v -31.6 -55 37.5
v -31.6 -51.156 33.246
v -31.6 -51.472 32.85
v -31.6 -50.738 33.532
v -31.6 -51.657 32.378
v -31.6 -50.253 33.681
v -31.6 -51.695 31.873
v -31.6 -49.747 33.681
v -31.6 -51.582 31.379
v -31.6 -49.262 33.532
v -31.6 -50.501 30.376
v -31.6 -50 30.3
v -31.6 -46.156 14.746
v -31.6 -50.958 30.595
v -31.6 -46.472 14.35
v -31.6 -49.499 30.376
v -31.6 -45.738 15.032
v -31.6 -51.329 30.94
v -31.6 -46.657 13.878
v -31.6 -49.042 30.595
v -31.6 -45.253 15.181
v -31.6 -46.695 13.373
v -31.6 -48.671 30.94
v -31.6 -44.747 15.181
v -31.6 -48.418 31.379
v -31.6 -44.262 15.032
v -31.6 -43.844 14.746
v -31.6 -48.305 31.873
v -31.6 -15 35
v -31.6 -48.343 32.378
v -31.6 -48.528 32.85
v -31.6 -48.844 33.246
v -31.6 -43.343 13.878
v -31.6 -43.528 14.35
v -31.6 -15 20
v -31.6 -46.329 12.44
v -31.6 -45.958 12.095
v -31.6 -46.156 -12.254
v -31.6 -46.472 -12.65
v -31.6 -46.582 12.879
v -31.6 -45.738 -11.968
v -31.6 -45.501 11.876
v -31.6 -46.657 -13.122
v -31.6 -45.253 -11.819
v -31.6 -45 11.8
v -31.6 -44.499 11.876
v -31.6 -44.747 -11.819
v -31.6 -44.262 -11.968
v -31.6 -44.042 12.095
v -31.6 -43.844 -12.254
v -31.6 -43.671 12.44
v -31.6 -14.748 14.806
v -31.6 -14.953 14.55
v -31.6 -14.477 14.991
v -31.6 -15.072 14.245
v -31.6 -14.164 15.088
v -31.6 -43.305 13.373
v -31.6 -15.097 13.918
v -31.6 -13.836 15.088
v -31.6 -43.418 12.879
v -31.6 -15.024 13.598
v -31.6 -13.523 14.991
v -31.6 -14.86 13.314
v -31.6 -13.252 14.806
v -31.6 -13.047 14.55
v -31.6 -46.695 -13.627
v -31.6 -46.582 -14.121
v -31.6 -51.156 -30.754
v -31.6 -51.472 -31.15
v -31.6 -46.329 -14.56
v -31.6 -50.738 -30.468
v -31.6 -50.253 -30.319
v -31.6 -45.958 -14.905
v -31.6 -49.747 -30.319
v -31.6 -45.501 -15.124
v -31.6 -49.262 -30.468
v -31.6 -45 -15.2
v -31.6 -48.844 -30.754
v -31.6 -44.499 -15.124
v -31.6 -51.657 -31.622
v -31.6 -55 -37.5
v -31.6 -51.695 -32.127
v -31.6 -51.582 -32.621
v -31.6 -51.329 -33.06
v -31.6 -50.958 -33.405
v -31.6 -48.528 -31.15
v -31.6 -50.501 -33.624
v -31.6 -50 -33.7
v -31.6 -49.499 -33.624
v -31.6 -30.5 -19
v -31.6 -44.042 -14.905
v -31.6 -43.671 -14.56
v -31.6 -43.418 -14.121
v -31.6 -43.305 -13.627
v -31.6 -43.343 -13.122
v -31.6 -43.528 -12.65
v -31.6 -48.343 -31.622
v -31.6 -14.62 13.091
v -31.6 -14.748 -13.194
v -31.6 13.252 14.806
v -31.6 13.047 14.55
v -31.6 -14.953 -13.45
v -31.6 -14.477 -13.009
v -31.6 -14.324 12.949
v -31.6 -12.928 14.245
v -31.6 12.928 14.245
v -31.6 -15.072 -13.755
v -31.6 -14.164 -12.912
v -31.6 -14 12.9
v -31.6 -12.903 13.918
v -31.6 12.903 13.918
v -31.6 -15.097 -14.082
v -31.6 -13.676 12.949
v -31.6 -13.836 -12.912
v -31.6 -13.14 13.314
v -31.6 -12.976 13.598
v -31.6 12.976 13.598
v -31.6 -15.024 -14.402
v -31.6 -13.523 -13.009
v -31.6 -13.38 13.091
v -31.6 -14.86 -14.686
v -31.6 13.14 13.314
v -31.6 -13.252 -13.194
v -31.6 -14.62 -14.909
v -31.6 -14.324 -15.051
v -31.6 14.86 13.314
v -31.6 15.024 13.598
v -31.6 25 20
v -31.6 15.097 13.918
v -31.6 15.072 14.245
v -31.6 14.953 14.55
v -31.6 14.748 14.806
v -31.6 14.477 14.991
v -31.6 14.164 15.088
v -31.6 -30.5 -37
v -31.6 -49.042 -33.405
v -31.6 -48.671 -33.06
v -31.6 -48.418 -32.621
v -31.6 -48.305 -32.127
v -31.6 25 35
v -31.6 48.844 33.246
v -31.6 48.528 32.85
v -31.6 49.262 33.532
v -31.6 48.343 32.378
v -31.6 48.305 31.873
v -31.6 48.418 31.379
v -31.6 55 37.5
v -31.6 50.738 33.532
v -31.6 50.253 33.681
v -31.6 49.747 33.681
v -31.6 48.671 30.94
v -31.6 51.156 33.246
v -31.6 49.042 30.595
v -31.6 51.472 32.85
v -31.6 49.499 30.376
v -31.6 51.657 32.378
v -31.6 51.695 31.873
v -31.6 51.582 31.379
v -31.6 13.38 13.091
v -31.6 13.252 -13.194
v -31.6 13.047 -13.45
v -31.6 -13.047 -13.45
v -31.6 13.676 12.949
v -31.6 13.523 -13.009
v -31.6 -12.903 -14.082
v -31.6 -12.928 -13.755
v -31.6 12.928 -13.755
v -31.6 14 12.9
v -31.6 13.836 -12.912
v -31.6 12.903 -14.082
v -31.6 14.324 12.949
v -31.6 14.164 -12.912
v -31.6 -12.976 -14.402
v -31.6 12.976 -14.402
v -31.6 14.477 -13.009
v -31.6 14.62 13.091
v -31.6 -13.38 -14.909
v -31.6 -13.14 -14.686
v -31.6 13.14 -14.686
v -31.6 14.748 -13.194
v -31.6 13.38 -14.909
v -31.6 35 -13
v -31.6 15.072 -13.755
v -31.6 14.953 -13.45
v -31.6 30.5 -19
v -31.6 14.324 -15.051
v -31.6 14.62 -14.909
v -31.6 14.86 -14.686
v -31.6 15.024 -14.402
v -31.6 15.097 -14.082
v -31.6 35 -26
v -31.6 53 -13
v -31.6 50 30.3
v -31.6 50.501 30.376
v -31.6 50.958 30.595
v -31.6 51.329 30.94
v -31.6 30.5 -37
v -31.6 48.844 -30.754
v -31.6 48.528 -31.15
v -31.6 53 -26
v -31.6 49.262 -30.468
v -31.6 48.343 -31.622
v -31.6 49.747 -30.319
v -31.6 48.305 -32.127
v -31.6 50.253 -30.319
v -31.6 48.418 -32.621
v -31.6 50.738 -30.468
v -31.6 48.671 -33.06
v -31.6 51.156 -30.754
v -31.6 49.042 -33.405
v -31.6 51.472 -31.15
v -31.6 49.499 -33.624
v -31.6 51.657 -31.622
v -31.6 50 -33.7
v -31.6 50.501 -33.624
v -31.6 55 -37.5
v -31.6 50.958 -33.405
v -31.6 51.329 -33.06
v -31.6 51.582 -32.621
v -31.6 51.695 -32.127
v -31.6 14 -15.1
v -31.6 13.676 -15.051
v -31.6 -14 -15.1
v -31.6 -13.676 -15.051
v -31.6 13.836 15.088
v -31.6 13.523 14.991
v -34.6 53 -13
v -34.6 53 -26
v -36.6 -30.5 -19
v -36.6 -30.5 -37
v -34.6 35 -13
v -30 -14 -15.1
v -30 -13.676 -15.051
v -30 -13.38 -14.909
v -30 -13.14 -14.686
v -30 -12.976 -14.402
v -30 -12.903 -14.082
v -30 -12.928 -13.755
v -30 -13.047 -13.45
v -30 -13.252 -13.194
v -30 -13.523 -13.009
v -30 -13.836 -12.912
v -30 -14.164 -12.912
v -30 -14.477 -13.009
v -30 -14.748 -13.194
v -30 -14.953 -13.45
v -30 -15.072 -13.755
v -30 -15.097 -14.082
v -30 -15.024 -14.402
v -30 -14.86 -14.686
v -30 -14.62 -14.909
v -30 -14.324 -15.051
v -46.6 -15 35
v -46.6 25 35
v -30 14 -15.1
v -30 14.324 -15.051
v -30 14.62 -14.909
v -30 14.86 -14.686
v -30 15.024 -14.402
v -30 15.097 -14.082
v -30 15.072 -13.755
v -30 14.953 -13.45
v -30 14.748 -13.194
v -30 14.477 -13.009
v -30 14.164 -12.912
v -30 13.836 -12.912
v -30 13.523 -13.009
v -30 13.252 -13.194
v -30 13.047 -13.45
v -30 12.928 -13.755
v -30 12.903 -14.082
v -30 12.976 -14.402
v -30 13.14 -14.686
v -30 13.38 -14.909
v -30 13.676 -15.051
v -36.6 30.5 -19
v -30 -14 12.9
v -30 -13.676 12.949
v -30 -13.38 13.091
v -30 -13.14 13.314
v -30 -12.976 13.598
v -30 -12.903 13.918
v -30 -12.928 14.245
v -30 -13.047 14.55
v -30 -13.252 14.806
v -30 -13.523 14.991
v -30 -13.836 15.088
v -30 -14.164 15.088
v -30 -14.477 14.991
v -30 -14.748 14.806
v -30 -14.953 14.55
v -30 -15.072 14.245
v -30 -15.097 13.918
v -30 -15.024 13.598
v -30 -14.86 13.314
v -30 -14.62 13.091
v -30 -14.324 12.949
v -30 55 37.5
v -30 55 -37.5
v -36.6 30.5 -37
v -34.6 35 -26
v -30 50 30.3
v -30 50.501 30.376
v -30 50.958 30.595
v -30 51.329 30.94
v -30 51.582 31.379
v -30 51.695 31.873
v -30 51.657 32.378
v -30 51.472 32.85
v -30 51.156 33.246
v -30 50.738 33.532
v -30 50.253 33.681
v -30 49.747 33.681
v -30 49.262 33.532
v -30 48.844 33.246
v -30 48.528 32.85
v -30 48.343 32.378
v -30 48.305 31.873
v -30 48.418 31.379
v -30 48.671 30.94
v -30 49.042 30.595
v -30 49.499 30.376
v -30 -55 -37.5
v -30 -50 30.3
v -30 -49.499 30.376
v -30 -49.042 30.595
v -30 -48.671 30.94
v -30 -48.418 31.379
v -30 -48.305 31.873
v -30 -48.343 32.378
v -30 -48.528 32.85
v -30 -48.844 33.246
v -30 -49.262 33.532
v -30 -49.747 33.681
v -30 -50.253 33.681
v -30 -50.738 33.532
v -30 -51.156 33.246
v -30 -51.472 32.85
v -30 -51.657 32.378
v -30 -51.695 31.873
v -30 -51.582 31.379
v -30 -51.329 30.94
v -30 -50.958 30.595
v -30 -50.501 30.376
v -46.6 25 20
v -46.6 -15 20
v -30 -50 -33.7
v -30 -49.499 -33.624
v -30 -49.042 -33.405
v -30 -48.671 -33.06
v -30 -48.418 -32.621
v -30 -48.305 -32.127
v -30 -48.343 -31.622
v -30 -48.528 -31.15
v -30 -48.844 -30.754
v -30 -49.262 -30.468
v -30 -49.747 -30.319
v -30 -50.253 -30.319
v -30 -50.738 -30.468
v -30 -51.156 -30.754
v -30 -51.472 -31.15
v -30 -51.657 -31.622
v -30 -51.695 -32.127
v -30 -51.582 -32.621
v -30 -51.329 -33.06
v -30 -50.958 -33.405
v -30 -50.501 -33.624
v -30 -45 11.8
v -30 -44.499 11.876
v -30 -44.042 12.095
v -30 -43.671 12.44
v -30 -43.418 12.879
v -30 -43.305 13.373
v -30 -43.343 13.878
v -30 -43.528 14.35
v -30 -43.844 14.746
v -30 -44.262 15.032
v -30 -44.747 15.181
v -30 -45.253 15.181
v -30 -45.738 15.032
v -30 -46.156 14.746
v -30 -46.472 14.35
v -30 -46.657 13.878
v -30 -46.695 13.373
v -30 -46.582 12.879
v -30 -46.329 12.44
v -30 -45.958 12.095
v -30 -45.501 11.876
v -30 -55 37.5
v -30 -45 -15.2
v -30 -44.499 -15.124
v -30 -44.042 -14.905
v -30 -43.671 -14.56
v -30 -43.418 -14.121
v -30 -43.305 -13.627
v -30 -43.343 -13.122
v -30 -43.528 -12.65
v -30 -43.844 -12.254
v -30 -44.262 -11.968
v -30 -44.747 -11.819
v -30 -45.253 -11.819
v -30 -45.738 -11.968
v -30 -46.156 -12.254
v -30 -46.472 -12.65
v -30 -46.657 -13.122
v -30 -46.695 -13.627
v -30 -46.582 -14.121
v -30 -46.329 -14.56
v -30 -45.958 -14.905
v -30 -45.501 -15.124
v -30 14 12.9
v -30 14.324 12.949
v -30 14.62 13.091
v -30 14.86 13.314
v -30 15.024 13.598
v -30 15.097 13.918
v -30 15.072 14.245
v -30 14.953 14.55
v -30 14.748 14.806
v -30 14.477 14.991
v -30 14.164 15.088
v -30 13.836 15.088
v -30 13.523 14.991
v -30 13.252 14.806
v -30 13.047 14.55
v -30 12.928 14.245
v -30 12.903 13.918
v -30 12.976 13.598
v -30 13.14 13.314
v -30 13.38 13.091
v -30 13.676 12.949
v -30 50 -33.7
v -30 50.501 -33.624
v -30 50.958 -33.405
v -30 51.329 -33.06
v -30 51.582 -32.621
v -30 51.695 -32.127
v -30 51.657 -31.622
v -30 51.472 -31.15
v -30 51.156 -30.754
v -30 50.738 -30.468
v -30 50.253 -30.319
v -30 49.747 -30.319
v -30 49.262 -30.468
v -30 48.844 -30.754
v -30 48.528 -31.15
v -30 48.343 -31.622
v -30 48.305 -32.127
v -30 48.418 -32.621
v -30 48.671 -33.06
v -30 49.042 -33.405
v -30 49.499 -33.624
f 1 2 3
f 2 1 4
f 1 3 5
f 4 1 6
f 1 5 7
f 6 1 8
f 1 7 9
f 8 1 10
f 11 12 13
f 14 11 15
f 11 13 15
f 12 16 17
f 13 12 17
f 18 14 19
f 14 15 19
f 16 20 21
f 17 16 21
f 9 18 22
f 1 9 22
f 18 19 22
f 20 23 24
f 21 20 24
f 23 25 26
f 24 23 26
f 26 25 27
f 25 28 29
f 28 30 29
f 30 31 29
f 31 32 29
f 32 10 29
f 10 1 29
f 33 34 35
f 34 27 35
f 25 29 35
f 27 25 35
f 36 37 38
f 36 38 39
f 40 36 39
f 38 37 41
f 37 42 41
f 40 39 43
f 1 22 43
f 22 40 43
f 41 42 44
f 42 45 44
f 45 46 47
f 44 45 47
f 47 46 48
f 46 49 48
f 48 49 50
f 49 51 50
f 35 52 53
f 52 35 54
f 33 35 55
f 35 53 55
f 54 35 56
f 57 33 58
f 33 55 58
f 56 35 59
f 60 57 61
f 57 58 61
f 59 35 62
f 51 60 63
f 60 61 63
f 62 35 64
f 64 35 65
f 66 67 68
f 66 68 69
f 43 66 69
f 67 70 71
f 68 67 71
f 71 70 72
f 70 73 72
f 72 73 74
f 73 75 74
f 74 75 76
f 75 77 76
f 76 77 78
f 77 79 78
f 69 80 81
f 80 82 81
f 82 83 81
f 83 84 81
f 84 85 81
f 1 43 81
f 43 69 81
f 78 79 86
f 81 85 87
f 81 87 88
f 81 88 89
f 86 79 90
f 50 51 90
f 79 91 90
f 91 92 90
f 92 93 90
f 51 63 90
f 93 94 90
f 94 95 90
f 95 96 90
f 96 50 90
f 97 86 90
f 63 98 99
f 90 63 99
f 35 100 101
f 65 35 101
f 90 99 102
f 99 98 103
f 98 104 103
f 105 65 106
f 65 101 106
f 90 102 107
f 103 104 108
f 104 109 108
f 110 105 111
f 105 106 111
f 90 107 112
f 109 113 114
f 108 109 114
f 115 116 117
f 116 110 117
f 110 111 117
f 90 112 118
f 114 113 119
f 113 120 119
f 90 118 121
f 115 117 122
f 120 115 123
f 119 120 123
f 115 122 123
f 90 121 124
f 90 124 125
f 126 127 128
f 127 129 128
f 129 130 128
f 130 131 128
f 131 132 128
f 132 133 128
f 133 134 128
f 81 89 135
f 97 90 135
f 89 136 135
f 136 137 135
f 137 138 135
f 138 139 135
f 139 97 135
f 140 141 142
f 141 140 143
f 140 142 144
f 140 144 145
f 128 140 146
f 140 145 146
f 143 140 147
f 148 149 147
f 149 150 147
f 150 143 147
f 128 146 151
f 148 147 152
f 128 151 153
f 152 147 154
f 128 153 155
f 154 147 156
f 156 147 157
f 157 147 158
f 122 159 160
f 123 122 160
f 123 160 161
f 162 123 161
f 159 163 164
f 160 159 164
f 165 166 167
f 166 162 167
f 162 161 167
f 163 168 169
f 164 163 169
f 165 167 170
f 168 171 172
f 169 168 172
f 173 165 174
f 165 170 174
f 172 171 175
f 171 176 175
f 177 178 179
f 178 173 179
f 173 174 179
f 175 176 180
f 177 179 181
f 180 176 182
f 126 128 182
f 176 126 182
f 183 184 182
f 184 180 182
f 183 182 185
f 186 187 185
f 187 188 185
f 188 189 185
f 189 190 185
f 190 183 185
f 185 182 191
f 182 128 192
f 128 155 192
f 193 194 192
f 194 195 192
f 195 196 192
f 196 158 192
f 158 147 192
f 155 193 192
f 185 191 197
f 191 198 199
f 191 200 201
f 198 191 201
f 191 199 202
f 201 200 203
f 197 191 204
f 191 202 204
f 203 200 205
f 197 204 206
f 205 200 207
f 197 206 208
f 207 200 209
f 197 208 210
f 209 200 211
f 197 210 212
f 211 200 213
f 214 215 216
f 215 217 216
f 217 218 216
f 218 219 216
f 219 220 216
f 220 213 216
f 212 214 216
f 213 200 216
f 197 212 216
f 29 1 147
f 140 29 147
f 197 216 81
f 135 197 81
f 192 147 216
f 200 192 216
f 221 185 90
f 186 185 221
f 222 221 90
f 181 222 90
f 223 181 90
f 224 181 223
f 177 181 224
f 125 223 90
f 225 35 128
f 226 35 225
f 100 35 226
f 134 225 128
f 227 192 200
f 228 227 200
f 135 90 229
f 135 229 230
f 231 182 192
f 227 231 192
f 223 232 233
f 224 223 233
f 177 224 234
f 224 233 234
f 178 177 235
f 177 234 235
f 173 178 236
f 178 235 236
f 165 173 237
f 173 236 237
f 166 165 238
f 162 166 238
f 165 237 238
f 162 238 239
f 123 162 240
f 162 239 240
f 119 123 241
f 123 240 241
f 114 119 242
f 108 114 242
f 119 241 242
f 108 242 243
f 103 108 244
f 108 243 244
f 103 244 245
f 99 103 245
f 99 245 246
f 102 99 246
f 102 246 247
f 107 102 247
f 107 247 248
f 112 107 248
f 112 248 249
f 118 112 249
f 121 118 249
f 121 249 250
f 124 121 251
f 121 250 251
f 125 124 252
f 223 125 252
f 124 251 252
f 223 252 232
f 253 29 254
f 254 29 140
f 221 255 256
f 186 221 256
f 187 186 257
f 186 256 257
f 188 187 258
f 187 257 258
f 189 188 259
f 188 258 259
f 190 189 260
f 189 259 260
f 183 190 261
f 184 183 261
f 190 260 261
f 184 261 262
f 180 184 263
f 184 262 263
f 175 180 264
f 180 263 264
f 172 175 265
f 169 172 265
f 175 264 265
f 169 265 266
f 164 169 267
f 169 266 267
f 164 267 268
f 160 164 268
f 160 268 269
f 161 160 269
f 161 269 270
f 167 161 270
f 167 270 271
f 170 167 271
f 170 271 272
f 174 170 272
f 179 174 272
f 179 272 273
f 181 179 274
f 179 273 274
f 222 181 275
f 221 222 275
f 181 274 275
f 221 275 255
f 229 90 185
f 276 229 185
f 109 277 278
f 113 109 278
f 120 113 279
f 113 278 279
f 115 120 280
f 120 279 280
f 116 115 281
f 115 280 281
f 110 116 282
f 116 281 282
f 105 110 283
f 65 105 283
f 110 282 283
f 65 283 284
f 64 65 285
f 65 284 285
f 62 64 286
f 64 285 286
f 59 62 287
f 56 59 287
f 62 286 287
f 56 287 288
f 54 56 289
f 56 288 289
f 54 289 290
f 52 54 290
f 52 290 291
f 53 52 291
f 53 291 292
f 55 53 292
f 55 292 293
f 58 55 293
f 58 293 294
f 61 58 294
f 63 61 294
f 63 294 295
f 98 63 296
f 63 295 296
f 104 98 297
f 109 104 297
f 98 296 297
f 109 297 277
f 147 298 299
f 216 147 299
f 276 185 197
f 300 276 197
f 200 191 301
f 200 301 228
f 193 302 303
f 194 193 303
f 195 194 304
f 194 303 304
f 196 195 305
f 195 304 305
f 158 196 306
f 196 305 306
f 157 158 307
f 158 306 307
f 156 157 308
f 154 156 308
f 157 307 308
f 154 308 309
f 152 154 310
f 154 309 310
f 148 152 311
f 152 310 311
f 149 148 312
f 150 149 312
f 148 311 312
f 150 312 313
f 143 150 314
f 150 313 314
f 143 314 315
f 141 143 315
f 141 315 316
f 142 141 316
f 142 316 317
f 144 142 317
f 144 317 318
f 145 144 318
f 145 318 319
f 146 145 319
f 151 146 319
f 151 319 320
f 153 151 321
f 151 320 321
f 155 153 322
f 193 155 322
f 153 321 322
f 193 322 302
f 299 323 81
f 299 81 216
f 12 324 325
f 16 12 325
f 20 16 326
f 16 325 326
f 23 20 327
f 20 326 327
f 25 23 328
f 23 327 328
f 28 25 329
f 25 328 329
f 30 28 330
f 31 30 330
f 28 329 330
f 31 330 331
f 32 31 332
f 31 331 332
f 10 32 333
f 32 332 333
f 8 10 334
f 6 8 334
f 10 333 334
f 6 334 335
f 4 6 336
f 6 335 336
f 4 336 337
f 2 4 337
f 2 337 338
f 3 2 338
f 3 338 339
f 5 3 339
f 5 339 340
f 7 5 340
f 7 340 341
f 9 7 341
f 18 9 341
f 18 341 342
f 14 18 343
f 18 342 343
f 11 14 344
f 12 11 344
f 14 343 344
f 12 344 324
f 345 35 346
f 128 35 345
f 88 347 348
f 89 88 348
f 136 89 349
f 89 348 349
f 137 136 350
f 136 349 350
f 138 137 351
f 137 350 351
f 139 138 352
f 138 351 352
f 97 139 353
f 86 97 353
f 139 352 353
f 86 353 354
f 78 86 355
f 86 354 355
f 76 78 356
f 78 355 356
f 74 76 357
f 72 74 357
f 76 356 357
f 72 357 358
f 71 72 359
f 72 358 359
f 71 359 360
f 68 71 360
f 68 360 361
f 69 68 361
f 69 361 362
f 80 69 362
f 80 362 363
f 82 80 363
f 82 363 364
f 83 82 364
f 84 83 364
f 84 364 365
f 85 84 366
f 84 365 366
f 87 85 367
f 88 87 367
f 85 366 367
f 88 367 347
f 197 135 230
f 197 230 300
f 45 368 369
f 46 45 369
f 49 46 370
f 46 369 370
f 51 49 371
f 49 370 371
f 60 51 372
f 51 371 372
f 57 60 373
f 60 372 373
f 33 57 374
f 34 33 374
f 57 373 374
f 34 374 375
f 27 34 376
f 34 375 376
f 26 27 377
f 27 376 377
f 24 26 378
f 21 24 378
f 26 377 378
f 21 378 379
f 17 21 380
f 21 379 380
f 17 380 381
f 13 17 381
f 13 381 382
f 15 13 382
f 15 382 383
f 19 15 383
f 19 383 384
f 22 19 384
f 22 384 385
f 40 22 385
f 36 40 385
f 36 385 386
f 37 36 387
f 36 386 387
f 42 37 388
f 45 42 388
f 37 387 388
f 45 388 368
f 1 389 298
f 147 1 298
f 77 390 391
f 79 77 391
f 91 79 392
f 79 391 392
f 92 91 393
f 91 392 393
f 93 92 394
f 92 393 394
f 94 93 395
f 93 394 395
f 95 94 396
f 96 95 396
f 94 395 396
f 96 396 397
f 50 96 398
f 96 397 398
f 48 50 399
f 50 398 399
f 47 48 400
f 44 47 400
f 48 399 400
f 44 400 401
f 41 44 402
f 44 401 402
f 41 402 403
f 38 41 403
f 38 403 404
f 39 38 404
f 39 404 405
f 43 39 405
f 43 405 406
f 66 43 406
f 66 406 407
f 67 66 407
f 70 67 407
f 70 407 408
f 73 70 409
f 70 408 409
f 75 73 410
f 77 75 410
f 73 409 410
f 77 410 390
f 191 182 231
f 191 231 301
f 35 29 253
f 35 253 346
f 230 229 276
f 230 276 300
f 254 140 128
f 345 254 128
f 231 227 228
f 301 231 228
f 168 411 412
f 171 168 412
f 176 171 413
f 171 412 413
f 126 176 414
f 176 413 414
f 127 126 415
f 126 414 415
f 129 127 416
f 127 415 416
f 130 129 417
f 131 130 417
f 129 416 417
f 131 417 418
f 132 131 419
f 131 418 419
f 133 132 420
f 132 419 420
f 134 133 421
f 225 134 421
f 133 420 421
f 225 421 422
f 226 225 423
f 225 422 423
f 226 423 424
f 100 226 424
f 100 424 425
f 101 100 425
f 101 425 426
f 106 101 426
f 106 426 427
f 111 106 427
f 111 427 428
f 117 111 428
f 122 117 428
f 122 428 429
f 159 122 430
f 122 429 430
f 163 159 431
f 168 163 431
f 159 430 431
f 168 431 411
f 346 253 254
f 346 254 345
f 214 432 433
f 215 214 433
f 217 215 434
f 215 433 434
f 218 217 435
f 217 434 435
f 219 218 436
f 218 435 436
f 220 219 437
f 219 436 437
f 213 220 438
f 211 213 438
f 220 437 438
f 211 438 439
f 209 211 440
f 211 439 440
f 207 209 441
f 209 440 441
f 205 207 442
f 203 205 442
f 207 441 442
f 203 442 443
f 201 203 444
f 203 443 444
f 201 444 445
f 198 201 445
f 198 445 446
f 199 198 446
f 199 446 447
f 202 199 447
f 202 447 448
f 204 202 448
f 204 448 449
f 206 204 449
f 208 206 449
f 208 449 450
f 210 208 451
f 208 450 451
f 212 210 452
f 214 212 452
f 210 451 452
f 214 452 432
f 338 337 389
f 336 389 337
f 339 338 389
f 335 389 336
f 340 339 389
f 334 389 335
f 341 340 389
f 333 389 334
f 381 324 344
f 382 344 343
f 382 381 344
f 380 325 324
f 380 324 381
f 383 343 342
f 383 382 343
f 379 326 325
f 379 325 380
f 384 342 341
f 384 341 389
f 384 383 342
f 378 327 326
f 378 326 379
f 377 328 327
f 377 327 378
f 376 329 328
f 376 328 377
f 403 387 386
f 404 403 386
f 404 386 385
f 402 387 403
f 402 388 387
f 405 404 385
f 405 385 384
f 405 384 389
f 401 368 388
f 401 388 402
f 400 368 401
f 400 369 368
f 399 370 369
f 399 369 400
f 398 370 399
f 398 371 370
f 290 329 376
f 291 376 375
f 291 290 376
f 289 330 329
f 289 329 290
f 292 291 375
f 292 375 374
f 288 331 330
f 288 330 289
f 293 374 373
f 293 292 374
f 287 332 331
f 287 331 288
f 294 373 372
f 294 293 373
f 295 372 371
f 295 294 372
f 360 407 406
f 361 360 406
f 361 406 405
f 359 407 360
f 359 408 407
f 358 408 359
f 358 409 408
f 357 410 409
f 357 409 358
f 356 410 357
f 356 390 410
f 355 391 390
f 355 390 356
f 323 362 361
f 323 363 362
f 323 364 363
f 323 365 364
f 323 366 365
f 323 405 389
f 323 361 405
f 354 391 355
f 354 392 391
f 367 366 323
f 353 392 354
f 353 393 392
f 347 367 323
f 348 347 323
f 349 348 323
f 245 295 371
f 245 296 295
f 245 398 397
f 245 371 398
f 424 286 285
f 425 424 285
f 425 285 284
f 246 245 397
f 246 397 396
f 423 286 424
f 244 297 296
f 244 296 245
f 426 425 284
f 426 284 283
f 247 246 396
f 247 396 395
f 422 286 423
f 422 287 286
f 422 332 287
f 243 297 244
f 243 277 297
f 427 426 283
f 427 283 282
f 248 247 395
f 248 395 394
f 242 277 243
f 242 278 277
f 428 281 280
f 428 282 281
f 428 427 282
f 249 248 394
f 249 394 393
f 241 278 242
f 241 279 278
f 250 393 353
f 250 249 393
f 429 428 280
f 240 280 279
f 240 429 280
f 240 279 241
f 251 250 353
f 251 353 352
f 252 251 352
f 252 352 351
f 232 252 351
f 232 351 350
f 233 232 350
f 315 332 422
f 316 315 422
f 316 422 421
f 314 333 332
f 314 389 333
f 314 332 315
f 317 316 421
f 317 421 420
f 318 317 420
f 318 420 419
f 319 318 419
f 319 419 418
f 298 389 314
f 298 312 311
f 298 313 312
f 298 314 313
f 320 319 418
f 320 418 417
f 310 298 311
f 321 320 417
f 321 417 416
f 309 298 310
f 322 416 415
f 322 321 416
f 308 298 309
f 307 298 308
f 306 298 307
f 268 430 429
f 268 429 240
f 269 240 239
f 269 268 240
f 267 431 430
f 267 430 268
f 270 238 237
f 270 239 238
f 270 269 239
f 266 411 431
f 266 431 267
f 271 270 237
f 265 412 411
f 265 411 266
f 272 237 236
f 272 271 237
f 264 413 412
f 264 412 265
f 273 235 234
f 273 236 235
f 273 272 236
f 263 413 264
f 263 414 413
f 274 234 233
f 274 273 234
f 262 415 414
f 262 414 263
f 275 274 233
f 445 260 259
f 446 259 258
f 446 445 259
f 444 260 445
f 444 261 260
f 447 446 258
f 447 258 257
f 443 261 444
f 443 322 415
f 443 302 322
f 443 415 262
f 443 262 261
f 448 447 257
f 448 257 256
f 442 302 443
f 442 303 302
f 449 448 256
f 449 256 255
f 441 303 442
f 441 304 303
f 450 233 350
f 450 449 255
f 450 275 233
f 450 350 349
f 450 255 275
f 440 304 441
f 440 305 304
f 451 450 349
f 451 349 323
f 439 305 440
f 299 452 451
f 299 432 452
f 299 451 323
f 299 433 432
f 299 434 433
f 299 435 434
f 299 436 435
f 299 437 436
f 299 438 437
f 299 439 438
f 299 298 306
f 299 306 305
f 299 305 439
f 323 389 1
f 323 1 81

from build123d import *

# Parameters (mm, degrees)
BOARD_START                         = -30
BOARD_SKETCH_W                      = 75
BOARD_SKETCH_H                      = 110
BOARD_SKETCH_R                      = 1.7
BOARD_SKETCH_R_2                    = 1.1
BOARD_DEPTH                         = 1.6
TEENSY_START                        = -31.6
TEENSY_4_1_SKETCH_W                 = 18
TEENSY_4_1_SKETCH_H                 = 61
TEENSY_4_1_DEPTH                    = 5
BAROMETER_START                     = -31.6
BAROMETER_BMP388_BOARD_EST_SKETCH_W = 13
BAROMETER_BMP388_BOARD_EST_SKETCH_H = 18
BAROMETER_BMP388_BOARD_EST_DEPTH    = 3
VENT_START                          = -31.6
VENT_BACKUP_SKETCH_W                = 15
VENT_BACKUP_SKETCH_H                = 40
VENT_BACKUP_DEPTH                   = 15


with BuildPart() as part:
    # Board Sketch → Board (new body)
    with BuildSketch(Plane(origin=(0, 0, 0), x_dir=(0, 0, -1), z_dir=(1, 0, 0)).offset(BOARD_START)):
        Rectangle(BOARD_SKETCH_W, BOARD_SKETCH_H)
        with Locations((32, -50)):
            Circle(BOARD_SKETCH_R, mode=Mode.SUBTRACT)
        with Locations((-32, -50)):
            Circle(BOARD_SKETCH_R, mode=Mode.SUBTRACT)
        with Locations((32, 50)):
            Circle(BOARD_SKETCH_R, mode=Mode.SUBTRACT)
        with Locations((-32, 50)):
            Circle(BOARD_SKETCH_R, mode=Mode.SUBTRACT)
        with Locations((13.5, -45)):
            Circle(BOARD_SKETCH_R, mode=Mode.SUBTRACT)
        with Locations((-13.5, -45)):
            Circle(BOARD_SKETCH_R, mode=Mode.SUBTRACT)
        with Locations((14, -14)):
            Circle(BOARD_SKETCH_R_2, mode=Mode.SUBTRACT)
        with Locations((-14, -14)):
            Circle(BOARD_SKETCH_R_2, mode=Mode.SUBTRACT)
        with Locations((14, 14)):
            Circle(BOARD_SKETCH_R_2, mode=Mode.SUBTRACT)
        with Locations((-14, 14)):
            Circle(BOARD_SKETCH_R_2, mode=Mode.SUBTRACT)
    extrude(amount=-BOARD_DEPTH)

    # Teensy 4.1 Sketch → Teensy 4.1 (add)
    with BuildSketch(Plane(origin=(0, 0, 0), x_dir=(0, 0, -1), z_dir=(1, 0, 0)).offset(TEENSY_START)):
        with Locations((28, 0)):
            Rectangle(TEENSY_4_1_SKETCH_W, TEENSY_4_1_SKETCH_H)
    extrude(amount=-TEENSY_4_1_DEPTH)

    # Barometer BMP388 board [est] Sketch → Barometer BMP388 board [est] (add)
    with BuildSketch(Plane(origin=(0, 0, 0), x_dir=(0, 0, -1), z_dir=(1, 0, 0)).offset(BAROMETER_START)):
        with Locations((19.5, 44)):
            Rectangle(BAROMETER_BMP388_BOARD_EST_SKETCH_W, BAROMETER_BMP388_BOARD_EST_SKETCH_H)
    extrude(amount=-BAROMETER_BMP388_BOARD_EST_DEPTH)

    # Vent backup Sketch → Vent backup (add)
    with BuildSketch(Plane(origin=(0, 0, 0), x_dir=(0, 0, -1), z_dir=(1, 0, 0)).offset(VENT_START)):
        with Locations((-27.5, 5)):
            Rectangle(VENT_BACKUP_SKETCH_W, VENT_BACKUP_SKETCH_H)
    extrude(amount=-VENT_BACKUP_DEPTH)


solid = part.part
